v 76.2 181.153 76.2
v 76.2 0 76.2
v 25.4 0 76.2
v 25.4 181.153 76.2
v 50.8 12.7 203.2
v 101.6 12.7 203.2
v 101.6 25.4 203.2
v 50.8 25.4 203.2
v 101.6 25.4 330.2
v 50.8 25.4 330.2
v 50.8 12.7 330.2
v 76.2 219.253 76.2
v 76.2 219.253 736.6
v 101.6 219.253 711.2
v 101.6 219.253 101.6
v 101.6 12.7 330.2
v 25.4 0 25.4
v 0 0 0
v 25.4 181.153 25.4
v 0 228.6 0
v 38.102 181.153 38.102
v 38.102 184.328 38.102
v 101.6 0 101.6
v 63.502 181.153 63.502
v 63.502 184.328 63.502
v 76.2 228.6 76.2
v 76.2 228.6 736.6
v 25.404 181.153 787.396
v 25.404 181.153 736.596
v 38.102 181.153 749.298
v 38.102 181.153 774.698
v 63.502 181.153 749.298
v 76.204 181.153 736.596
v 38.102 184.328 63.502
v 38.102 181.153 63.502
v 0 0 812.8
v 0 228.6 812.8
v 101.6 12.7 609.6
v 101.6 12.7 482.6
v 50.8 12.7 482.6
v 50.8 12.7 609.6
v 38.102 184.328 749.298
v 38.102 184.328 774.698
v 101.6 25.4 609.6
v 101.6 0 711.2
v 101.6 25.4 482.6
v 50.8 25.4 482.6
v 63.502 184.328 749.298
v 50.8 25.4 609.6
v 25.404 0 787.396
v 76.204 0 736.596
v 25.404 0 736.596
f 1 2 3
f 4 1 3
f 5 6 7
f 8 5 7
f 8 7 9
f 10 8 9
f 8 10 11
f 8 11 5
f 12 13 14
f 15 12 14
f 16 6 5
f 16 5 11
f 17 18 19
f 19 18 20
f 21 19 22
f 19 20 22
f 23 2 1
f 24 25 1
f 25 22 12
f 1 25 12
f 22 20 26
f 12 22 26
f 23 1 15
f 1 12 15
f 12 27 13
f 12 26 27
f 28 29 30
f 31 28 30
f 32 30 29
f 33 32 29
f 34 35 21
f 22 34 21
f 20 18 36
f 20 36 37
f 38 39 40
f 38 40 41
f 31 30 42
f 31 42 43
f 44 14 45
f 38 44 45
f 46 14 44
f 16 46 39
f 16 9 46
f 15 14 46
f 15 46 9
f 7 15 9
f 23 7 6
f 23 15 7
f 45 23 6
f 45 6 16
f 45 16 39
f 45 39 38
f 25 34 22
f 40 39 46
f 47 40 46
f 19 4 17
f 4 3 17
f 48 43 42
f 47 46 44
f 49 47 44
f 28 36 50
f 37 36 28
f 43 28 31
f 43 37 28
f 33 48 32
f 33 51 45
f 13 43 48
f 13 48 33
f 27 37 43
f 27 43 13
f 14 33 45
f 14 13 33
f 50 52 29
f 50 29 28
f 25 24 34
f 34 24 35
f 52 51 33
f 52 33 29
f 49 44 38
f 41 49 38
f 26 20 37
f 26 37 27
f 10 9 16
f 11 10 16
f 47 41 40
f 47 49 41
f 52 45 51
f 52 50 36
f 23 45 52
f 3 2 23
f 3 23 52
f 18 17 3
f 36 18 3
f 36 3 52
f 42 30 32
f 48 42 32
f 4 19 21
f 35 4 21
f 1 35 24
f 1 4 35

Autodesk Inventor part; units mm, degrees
ref_plane "YZ Plane" through (0, 0, 0) normal (1, 0, 0) x (0, 1, 0)
ref_plane "XZ Plane" through (0, 0, 0) normal (0, 1, 0) x (-1, 0, 0)
ref_plane "XY Plane" through (0, 0, 0) normal (0, 0, 1) x (1, 0, 0)
sketch "Sketch1" plane through (0, 0, 0) normal (0, 0, 1) x (1, 0, 0)
  line L0 (0, 0) -> (0, 228.6)
  line L1 (0, 228.6) -> (76.2, 228.6)
  line L2 (76.2, 228.6) -> (76.2, 219.2528)
  line L3 (76.2, 219.2528) -> (101.6, 219.2528)
  line L4 (101.6, 219.2528) -> (101.6, 0)
  line L5 (101.6, 0) -> (0, 0)
  dimension "d0" = 228.6
  dimension "d1" = 76.2
  dimension "d2" = 9.3472
  dimension "d3" = 25.4
extrude "Extrusion1" add sketch "Sketch1" along normal blind 812.8
sketch "Sketch6" plane through (0, 0, 0) normal (0, -1, 0) x (1, 0, 0)
  line L0 (101.6, 0) -> (101.6, 812.8) projected
  line L1 (0, 812.8) -> (101.6, 711.2) projected
  line L2 (76.2038, 736.5962) -> (25.4038, 736.5962)
  line L3 (25.4038, 736.5962) -> (25.4038, 787.3962)
  line L4 (25.4038, 787.3962) -> (76.2, 736.6)
  point P0 (0, 0)
  point P1 (101.6, 101.6)
  dimension "d31" = 35.9156
  dimension "d32" = 50.8
  dimension "d33" = 50.8
extrude "Extrusion4" cut sketch "Sketch6" against normal blind 181.1528
sketch "Sketch7" plane through (25.4038, 0, 736.5962) normal (0, -1, 0) x (1, 0, 0)
  line L0 (76.1962, -634.9962) -> (50.7962, -660.3962)
  line L1 (50.7962, -660.3962) -> (-0.0038, -660.3962)
  line L2 (76.1962, -634.9962) -> (-25.4038, -736.5962) projected
  line L3 (76.1962, -736.5962) -> (76.1962, 76.2038) projected
  line L4 (-0.0038, -660.3962) -> (-0.0038, -711.1962)
  line L5 (-0.0038, -711.1962) -> (50.7962, -660.3962)
  point P0 (76.1962, -25.3962)
  dimension "d39" = 50.8
  dimension "d41" = 90
  dimension "d42" = 50.8
extrude "Extrusion5" cut sketch "Sketch7" against normal blind 181.1528
chamfer "Chamfer5" distance 101.6 angle 45 1 edges at (101.6, 109.6264, 812.8)
chamfer "Chamfer6" distance 101.6 angle 45 1 edges at (101.6, 109.6264, 0)
sketch "Sketch8" plane through (25.4038, 181.1528, 736.5962) normal (0, -1, 0) x (1, 0, 0)
  line L0 (-25.4038, -736.5962) -> (50.7962, -660.3962) projected
  line L1 (50.7962, -660.3962) -> (38.0981, -673.0942)
  line L2 (38.0981, -673.0942) -> (12.6981, -673.0942)
  line L3 (12.6981, -673.0942) -> (12.6981, -698.4942)
  dimension "d54" = 17.9578
  dimension "d55" = 25.4
  dimension "d56" = 25.4
extrude "Extrusion6" cut sketch "Sketch8" against normal blind 3.175
sketch "Sketch9" plane through (0, 181.1528, 0) normal (0, -1, 0) x (1, 0, 0)
  line L0 (76.2, 736.6) -> (63.5019, 749.2981)
  line L1 (38.1019, 749.2981) -> (63.5019, 749.2981)
  line L2 (38.1019, 749.2981) -> (38.1019, 774.6981)
  line L3 (38.1019, 774.6981) -> (63.5019, 749.2981)
  line L4 (25.4038, 787.3962) -> (76.2038, 736.5962) projected
  point P0 (0, 0)
extrude "Extrusion8" cut sketch "Sketch9" against normal blind 3.175
sketch "Sketch10" plane through (101.6, 0, 711.2) normal (1, 0, 0) x (0, 0, -1)
  line L0 (609.6, 219.2528) -> (0, 219.2528) projected
  line L1 (609.6, 219.2528) -> (609.6, 0) projected
  line L2 (609.6, 219.2528) -> (609.6, 0)
  line L3 (609.6, 0) -> (609.6, 12.7)
  line L4 (508, 12.7) -> (381, 12.7)
  line L5 (228.6, 12.7) -> (101.6, 12.7)
  line L6 (508, 12.7) -> (508, 25.4)
  line L7 (508, 25.4) -> (381, 25.4)
  line L8 (381, 25.4) -> (381, 12.7)
  line L9 (228.6, 12.7) -> (228.6, 25.4)
  line L10 (228.6, 25.4) -> (101.6, 25.4)
  line L11 (101.6, 25.4) -> (101.6, 12.7)
  point P0 (711.2, 0)
  dimension "d70" = 12.7
  dimension "d71" = 101.6
  dimension "d72" = 127
  dimension "d73" = 152.4
  dimension "d74" = 127
  dimension "d75" = 12.7
  dimension "d76" = 12.7
  dimension "d77" = 193.8528
extrude "Extrusion9" cut sketch "Sketch10" against normal blind 50.8 contours L5 L11 L10 L9
sketch "Sketch11" plane through (101.6, 0, 711.2) normal (1, 0, 0) x (0, 0, -1)
  line L0 (609.6, 219.2528) -> (0, 219.2528)
  line L1 (609.6, 219.2528) -> (609.6, 0)
  line L2 (609.6, 219.2528) -> (609.6, 0)
  line L3 (609.6, 0) -> (609.6, 12.7)
  line L4 (508, 12.7) -> (381, 12.7)
  line L5 (228.6, 12.7) -> (101.6, 12.7)
  line L6 (508, 12.7) -> (508, 25.4)
  line L7 (508, 25.4) -> (381, 25.4)
  line L8 (381, 25.4) -> (381, 12.7)
  line L9 (228.6, 12.7) -> (228.6, 25.4)
  line L10 (228.6, 25.4) -> (101.6, 25.4)
  line L11 (101.6, 25.4) -> (101.6, 12.7)
  point P0 (711.2, 0)
  point P1 (711.2, 0)
  dimension "d80" = 12.7
  dimension "d81" = 101.6
  dimension "d82" = 127
  dimension "d83" = 152.4
  dimension "d84" = 127
  dimension "d85" = 12.7
  dimension "d86" = 12.7
  dimension "d87" = 193.8528
extrude "Extrusion10" cut sketch "Sketch11" against normal blind 50.8 contours L4 L8 L7 L6
properties part number "SideWidth" material "Wood (Birch)"
